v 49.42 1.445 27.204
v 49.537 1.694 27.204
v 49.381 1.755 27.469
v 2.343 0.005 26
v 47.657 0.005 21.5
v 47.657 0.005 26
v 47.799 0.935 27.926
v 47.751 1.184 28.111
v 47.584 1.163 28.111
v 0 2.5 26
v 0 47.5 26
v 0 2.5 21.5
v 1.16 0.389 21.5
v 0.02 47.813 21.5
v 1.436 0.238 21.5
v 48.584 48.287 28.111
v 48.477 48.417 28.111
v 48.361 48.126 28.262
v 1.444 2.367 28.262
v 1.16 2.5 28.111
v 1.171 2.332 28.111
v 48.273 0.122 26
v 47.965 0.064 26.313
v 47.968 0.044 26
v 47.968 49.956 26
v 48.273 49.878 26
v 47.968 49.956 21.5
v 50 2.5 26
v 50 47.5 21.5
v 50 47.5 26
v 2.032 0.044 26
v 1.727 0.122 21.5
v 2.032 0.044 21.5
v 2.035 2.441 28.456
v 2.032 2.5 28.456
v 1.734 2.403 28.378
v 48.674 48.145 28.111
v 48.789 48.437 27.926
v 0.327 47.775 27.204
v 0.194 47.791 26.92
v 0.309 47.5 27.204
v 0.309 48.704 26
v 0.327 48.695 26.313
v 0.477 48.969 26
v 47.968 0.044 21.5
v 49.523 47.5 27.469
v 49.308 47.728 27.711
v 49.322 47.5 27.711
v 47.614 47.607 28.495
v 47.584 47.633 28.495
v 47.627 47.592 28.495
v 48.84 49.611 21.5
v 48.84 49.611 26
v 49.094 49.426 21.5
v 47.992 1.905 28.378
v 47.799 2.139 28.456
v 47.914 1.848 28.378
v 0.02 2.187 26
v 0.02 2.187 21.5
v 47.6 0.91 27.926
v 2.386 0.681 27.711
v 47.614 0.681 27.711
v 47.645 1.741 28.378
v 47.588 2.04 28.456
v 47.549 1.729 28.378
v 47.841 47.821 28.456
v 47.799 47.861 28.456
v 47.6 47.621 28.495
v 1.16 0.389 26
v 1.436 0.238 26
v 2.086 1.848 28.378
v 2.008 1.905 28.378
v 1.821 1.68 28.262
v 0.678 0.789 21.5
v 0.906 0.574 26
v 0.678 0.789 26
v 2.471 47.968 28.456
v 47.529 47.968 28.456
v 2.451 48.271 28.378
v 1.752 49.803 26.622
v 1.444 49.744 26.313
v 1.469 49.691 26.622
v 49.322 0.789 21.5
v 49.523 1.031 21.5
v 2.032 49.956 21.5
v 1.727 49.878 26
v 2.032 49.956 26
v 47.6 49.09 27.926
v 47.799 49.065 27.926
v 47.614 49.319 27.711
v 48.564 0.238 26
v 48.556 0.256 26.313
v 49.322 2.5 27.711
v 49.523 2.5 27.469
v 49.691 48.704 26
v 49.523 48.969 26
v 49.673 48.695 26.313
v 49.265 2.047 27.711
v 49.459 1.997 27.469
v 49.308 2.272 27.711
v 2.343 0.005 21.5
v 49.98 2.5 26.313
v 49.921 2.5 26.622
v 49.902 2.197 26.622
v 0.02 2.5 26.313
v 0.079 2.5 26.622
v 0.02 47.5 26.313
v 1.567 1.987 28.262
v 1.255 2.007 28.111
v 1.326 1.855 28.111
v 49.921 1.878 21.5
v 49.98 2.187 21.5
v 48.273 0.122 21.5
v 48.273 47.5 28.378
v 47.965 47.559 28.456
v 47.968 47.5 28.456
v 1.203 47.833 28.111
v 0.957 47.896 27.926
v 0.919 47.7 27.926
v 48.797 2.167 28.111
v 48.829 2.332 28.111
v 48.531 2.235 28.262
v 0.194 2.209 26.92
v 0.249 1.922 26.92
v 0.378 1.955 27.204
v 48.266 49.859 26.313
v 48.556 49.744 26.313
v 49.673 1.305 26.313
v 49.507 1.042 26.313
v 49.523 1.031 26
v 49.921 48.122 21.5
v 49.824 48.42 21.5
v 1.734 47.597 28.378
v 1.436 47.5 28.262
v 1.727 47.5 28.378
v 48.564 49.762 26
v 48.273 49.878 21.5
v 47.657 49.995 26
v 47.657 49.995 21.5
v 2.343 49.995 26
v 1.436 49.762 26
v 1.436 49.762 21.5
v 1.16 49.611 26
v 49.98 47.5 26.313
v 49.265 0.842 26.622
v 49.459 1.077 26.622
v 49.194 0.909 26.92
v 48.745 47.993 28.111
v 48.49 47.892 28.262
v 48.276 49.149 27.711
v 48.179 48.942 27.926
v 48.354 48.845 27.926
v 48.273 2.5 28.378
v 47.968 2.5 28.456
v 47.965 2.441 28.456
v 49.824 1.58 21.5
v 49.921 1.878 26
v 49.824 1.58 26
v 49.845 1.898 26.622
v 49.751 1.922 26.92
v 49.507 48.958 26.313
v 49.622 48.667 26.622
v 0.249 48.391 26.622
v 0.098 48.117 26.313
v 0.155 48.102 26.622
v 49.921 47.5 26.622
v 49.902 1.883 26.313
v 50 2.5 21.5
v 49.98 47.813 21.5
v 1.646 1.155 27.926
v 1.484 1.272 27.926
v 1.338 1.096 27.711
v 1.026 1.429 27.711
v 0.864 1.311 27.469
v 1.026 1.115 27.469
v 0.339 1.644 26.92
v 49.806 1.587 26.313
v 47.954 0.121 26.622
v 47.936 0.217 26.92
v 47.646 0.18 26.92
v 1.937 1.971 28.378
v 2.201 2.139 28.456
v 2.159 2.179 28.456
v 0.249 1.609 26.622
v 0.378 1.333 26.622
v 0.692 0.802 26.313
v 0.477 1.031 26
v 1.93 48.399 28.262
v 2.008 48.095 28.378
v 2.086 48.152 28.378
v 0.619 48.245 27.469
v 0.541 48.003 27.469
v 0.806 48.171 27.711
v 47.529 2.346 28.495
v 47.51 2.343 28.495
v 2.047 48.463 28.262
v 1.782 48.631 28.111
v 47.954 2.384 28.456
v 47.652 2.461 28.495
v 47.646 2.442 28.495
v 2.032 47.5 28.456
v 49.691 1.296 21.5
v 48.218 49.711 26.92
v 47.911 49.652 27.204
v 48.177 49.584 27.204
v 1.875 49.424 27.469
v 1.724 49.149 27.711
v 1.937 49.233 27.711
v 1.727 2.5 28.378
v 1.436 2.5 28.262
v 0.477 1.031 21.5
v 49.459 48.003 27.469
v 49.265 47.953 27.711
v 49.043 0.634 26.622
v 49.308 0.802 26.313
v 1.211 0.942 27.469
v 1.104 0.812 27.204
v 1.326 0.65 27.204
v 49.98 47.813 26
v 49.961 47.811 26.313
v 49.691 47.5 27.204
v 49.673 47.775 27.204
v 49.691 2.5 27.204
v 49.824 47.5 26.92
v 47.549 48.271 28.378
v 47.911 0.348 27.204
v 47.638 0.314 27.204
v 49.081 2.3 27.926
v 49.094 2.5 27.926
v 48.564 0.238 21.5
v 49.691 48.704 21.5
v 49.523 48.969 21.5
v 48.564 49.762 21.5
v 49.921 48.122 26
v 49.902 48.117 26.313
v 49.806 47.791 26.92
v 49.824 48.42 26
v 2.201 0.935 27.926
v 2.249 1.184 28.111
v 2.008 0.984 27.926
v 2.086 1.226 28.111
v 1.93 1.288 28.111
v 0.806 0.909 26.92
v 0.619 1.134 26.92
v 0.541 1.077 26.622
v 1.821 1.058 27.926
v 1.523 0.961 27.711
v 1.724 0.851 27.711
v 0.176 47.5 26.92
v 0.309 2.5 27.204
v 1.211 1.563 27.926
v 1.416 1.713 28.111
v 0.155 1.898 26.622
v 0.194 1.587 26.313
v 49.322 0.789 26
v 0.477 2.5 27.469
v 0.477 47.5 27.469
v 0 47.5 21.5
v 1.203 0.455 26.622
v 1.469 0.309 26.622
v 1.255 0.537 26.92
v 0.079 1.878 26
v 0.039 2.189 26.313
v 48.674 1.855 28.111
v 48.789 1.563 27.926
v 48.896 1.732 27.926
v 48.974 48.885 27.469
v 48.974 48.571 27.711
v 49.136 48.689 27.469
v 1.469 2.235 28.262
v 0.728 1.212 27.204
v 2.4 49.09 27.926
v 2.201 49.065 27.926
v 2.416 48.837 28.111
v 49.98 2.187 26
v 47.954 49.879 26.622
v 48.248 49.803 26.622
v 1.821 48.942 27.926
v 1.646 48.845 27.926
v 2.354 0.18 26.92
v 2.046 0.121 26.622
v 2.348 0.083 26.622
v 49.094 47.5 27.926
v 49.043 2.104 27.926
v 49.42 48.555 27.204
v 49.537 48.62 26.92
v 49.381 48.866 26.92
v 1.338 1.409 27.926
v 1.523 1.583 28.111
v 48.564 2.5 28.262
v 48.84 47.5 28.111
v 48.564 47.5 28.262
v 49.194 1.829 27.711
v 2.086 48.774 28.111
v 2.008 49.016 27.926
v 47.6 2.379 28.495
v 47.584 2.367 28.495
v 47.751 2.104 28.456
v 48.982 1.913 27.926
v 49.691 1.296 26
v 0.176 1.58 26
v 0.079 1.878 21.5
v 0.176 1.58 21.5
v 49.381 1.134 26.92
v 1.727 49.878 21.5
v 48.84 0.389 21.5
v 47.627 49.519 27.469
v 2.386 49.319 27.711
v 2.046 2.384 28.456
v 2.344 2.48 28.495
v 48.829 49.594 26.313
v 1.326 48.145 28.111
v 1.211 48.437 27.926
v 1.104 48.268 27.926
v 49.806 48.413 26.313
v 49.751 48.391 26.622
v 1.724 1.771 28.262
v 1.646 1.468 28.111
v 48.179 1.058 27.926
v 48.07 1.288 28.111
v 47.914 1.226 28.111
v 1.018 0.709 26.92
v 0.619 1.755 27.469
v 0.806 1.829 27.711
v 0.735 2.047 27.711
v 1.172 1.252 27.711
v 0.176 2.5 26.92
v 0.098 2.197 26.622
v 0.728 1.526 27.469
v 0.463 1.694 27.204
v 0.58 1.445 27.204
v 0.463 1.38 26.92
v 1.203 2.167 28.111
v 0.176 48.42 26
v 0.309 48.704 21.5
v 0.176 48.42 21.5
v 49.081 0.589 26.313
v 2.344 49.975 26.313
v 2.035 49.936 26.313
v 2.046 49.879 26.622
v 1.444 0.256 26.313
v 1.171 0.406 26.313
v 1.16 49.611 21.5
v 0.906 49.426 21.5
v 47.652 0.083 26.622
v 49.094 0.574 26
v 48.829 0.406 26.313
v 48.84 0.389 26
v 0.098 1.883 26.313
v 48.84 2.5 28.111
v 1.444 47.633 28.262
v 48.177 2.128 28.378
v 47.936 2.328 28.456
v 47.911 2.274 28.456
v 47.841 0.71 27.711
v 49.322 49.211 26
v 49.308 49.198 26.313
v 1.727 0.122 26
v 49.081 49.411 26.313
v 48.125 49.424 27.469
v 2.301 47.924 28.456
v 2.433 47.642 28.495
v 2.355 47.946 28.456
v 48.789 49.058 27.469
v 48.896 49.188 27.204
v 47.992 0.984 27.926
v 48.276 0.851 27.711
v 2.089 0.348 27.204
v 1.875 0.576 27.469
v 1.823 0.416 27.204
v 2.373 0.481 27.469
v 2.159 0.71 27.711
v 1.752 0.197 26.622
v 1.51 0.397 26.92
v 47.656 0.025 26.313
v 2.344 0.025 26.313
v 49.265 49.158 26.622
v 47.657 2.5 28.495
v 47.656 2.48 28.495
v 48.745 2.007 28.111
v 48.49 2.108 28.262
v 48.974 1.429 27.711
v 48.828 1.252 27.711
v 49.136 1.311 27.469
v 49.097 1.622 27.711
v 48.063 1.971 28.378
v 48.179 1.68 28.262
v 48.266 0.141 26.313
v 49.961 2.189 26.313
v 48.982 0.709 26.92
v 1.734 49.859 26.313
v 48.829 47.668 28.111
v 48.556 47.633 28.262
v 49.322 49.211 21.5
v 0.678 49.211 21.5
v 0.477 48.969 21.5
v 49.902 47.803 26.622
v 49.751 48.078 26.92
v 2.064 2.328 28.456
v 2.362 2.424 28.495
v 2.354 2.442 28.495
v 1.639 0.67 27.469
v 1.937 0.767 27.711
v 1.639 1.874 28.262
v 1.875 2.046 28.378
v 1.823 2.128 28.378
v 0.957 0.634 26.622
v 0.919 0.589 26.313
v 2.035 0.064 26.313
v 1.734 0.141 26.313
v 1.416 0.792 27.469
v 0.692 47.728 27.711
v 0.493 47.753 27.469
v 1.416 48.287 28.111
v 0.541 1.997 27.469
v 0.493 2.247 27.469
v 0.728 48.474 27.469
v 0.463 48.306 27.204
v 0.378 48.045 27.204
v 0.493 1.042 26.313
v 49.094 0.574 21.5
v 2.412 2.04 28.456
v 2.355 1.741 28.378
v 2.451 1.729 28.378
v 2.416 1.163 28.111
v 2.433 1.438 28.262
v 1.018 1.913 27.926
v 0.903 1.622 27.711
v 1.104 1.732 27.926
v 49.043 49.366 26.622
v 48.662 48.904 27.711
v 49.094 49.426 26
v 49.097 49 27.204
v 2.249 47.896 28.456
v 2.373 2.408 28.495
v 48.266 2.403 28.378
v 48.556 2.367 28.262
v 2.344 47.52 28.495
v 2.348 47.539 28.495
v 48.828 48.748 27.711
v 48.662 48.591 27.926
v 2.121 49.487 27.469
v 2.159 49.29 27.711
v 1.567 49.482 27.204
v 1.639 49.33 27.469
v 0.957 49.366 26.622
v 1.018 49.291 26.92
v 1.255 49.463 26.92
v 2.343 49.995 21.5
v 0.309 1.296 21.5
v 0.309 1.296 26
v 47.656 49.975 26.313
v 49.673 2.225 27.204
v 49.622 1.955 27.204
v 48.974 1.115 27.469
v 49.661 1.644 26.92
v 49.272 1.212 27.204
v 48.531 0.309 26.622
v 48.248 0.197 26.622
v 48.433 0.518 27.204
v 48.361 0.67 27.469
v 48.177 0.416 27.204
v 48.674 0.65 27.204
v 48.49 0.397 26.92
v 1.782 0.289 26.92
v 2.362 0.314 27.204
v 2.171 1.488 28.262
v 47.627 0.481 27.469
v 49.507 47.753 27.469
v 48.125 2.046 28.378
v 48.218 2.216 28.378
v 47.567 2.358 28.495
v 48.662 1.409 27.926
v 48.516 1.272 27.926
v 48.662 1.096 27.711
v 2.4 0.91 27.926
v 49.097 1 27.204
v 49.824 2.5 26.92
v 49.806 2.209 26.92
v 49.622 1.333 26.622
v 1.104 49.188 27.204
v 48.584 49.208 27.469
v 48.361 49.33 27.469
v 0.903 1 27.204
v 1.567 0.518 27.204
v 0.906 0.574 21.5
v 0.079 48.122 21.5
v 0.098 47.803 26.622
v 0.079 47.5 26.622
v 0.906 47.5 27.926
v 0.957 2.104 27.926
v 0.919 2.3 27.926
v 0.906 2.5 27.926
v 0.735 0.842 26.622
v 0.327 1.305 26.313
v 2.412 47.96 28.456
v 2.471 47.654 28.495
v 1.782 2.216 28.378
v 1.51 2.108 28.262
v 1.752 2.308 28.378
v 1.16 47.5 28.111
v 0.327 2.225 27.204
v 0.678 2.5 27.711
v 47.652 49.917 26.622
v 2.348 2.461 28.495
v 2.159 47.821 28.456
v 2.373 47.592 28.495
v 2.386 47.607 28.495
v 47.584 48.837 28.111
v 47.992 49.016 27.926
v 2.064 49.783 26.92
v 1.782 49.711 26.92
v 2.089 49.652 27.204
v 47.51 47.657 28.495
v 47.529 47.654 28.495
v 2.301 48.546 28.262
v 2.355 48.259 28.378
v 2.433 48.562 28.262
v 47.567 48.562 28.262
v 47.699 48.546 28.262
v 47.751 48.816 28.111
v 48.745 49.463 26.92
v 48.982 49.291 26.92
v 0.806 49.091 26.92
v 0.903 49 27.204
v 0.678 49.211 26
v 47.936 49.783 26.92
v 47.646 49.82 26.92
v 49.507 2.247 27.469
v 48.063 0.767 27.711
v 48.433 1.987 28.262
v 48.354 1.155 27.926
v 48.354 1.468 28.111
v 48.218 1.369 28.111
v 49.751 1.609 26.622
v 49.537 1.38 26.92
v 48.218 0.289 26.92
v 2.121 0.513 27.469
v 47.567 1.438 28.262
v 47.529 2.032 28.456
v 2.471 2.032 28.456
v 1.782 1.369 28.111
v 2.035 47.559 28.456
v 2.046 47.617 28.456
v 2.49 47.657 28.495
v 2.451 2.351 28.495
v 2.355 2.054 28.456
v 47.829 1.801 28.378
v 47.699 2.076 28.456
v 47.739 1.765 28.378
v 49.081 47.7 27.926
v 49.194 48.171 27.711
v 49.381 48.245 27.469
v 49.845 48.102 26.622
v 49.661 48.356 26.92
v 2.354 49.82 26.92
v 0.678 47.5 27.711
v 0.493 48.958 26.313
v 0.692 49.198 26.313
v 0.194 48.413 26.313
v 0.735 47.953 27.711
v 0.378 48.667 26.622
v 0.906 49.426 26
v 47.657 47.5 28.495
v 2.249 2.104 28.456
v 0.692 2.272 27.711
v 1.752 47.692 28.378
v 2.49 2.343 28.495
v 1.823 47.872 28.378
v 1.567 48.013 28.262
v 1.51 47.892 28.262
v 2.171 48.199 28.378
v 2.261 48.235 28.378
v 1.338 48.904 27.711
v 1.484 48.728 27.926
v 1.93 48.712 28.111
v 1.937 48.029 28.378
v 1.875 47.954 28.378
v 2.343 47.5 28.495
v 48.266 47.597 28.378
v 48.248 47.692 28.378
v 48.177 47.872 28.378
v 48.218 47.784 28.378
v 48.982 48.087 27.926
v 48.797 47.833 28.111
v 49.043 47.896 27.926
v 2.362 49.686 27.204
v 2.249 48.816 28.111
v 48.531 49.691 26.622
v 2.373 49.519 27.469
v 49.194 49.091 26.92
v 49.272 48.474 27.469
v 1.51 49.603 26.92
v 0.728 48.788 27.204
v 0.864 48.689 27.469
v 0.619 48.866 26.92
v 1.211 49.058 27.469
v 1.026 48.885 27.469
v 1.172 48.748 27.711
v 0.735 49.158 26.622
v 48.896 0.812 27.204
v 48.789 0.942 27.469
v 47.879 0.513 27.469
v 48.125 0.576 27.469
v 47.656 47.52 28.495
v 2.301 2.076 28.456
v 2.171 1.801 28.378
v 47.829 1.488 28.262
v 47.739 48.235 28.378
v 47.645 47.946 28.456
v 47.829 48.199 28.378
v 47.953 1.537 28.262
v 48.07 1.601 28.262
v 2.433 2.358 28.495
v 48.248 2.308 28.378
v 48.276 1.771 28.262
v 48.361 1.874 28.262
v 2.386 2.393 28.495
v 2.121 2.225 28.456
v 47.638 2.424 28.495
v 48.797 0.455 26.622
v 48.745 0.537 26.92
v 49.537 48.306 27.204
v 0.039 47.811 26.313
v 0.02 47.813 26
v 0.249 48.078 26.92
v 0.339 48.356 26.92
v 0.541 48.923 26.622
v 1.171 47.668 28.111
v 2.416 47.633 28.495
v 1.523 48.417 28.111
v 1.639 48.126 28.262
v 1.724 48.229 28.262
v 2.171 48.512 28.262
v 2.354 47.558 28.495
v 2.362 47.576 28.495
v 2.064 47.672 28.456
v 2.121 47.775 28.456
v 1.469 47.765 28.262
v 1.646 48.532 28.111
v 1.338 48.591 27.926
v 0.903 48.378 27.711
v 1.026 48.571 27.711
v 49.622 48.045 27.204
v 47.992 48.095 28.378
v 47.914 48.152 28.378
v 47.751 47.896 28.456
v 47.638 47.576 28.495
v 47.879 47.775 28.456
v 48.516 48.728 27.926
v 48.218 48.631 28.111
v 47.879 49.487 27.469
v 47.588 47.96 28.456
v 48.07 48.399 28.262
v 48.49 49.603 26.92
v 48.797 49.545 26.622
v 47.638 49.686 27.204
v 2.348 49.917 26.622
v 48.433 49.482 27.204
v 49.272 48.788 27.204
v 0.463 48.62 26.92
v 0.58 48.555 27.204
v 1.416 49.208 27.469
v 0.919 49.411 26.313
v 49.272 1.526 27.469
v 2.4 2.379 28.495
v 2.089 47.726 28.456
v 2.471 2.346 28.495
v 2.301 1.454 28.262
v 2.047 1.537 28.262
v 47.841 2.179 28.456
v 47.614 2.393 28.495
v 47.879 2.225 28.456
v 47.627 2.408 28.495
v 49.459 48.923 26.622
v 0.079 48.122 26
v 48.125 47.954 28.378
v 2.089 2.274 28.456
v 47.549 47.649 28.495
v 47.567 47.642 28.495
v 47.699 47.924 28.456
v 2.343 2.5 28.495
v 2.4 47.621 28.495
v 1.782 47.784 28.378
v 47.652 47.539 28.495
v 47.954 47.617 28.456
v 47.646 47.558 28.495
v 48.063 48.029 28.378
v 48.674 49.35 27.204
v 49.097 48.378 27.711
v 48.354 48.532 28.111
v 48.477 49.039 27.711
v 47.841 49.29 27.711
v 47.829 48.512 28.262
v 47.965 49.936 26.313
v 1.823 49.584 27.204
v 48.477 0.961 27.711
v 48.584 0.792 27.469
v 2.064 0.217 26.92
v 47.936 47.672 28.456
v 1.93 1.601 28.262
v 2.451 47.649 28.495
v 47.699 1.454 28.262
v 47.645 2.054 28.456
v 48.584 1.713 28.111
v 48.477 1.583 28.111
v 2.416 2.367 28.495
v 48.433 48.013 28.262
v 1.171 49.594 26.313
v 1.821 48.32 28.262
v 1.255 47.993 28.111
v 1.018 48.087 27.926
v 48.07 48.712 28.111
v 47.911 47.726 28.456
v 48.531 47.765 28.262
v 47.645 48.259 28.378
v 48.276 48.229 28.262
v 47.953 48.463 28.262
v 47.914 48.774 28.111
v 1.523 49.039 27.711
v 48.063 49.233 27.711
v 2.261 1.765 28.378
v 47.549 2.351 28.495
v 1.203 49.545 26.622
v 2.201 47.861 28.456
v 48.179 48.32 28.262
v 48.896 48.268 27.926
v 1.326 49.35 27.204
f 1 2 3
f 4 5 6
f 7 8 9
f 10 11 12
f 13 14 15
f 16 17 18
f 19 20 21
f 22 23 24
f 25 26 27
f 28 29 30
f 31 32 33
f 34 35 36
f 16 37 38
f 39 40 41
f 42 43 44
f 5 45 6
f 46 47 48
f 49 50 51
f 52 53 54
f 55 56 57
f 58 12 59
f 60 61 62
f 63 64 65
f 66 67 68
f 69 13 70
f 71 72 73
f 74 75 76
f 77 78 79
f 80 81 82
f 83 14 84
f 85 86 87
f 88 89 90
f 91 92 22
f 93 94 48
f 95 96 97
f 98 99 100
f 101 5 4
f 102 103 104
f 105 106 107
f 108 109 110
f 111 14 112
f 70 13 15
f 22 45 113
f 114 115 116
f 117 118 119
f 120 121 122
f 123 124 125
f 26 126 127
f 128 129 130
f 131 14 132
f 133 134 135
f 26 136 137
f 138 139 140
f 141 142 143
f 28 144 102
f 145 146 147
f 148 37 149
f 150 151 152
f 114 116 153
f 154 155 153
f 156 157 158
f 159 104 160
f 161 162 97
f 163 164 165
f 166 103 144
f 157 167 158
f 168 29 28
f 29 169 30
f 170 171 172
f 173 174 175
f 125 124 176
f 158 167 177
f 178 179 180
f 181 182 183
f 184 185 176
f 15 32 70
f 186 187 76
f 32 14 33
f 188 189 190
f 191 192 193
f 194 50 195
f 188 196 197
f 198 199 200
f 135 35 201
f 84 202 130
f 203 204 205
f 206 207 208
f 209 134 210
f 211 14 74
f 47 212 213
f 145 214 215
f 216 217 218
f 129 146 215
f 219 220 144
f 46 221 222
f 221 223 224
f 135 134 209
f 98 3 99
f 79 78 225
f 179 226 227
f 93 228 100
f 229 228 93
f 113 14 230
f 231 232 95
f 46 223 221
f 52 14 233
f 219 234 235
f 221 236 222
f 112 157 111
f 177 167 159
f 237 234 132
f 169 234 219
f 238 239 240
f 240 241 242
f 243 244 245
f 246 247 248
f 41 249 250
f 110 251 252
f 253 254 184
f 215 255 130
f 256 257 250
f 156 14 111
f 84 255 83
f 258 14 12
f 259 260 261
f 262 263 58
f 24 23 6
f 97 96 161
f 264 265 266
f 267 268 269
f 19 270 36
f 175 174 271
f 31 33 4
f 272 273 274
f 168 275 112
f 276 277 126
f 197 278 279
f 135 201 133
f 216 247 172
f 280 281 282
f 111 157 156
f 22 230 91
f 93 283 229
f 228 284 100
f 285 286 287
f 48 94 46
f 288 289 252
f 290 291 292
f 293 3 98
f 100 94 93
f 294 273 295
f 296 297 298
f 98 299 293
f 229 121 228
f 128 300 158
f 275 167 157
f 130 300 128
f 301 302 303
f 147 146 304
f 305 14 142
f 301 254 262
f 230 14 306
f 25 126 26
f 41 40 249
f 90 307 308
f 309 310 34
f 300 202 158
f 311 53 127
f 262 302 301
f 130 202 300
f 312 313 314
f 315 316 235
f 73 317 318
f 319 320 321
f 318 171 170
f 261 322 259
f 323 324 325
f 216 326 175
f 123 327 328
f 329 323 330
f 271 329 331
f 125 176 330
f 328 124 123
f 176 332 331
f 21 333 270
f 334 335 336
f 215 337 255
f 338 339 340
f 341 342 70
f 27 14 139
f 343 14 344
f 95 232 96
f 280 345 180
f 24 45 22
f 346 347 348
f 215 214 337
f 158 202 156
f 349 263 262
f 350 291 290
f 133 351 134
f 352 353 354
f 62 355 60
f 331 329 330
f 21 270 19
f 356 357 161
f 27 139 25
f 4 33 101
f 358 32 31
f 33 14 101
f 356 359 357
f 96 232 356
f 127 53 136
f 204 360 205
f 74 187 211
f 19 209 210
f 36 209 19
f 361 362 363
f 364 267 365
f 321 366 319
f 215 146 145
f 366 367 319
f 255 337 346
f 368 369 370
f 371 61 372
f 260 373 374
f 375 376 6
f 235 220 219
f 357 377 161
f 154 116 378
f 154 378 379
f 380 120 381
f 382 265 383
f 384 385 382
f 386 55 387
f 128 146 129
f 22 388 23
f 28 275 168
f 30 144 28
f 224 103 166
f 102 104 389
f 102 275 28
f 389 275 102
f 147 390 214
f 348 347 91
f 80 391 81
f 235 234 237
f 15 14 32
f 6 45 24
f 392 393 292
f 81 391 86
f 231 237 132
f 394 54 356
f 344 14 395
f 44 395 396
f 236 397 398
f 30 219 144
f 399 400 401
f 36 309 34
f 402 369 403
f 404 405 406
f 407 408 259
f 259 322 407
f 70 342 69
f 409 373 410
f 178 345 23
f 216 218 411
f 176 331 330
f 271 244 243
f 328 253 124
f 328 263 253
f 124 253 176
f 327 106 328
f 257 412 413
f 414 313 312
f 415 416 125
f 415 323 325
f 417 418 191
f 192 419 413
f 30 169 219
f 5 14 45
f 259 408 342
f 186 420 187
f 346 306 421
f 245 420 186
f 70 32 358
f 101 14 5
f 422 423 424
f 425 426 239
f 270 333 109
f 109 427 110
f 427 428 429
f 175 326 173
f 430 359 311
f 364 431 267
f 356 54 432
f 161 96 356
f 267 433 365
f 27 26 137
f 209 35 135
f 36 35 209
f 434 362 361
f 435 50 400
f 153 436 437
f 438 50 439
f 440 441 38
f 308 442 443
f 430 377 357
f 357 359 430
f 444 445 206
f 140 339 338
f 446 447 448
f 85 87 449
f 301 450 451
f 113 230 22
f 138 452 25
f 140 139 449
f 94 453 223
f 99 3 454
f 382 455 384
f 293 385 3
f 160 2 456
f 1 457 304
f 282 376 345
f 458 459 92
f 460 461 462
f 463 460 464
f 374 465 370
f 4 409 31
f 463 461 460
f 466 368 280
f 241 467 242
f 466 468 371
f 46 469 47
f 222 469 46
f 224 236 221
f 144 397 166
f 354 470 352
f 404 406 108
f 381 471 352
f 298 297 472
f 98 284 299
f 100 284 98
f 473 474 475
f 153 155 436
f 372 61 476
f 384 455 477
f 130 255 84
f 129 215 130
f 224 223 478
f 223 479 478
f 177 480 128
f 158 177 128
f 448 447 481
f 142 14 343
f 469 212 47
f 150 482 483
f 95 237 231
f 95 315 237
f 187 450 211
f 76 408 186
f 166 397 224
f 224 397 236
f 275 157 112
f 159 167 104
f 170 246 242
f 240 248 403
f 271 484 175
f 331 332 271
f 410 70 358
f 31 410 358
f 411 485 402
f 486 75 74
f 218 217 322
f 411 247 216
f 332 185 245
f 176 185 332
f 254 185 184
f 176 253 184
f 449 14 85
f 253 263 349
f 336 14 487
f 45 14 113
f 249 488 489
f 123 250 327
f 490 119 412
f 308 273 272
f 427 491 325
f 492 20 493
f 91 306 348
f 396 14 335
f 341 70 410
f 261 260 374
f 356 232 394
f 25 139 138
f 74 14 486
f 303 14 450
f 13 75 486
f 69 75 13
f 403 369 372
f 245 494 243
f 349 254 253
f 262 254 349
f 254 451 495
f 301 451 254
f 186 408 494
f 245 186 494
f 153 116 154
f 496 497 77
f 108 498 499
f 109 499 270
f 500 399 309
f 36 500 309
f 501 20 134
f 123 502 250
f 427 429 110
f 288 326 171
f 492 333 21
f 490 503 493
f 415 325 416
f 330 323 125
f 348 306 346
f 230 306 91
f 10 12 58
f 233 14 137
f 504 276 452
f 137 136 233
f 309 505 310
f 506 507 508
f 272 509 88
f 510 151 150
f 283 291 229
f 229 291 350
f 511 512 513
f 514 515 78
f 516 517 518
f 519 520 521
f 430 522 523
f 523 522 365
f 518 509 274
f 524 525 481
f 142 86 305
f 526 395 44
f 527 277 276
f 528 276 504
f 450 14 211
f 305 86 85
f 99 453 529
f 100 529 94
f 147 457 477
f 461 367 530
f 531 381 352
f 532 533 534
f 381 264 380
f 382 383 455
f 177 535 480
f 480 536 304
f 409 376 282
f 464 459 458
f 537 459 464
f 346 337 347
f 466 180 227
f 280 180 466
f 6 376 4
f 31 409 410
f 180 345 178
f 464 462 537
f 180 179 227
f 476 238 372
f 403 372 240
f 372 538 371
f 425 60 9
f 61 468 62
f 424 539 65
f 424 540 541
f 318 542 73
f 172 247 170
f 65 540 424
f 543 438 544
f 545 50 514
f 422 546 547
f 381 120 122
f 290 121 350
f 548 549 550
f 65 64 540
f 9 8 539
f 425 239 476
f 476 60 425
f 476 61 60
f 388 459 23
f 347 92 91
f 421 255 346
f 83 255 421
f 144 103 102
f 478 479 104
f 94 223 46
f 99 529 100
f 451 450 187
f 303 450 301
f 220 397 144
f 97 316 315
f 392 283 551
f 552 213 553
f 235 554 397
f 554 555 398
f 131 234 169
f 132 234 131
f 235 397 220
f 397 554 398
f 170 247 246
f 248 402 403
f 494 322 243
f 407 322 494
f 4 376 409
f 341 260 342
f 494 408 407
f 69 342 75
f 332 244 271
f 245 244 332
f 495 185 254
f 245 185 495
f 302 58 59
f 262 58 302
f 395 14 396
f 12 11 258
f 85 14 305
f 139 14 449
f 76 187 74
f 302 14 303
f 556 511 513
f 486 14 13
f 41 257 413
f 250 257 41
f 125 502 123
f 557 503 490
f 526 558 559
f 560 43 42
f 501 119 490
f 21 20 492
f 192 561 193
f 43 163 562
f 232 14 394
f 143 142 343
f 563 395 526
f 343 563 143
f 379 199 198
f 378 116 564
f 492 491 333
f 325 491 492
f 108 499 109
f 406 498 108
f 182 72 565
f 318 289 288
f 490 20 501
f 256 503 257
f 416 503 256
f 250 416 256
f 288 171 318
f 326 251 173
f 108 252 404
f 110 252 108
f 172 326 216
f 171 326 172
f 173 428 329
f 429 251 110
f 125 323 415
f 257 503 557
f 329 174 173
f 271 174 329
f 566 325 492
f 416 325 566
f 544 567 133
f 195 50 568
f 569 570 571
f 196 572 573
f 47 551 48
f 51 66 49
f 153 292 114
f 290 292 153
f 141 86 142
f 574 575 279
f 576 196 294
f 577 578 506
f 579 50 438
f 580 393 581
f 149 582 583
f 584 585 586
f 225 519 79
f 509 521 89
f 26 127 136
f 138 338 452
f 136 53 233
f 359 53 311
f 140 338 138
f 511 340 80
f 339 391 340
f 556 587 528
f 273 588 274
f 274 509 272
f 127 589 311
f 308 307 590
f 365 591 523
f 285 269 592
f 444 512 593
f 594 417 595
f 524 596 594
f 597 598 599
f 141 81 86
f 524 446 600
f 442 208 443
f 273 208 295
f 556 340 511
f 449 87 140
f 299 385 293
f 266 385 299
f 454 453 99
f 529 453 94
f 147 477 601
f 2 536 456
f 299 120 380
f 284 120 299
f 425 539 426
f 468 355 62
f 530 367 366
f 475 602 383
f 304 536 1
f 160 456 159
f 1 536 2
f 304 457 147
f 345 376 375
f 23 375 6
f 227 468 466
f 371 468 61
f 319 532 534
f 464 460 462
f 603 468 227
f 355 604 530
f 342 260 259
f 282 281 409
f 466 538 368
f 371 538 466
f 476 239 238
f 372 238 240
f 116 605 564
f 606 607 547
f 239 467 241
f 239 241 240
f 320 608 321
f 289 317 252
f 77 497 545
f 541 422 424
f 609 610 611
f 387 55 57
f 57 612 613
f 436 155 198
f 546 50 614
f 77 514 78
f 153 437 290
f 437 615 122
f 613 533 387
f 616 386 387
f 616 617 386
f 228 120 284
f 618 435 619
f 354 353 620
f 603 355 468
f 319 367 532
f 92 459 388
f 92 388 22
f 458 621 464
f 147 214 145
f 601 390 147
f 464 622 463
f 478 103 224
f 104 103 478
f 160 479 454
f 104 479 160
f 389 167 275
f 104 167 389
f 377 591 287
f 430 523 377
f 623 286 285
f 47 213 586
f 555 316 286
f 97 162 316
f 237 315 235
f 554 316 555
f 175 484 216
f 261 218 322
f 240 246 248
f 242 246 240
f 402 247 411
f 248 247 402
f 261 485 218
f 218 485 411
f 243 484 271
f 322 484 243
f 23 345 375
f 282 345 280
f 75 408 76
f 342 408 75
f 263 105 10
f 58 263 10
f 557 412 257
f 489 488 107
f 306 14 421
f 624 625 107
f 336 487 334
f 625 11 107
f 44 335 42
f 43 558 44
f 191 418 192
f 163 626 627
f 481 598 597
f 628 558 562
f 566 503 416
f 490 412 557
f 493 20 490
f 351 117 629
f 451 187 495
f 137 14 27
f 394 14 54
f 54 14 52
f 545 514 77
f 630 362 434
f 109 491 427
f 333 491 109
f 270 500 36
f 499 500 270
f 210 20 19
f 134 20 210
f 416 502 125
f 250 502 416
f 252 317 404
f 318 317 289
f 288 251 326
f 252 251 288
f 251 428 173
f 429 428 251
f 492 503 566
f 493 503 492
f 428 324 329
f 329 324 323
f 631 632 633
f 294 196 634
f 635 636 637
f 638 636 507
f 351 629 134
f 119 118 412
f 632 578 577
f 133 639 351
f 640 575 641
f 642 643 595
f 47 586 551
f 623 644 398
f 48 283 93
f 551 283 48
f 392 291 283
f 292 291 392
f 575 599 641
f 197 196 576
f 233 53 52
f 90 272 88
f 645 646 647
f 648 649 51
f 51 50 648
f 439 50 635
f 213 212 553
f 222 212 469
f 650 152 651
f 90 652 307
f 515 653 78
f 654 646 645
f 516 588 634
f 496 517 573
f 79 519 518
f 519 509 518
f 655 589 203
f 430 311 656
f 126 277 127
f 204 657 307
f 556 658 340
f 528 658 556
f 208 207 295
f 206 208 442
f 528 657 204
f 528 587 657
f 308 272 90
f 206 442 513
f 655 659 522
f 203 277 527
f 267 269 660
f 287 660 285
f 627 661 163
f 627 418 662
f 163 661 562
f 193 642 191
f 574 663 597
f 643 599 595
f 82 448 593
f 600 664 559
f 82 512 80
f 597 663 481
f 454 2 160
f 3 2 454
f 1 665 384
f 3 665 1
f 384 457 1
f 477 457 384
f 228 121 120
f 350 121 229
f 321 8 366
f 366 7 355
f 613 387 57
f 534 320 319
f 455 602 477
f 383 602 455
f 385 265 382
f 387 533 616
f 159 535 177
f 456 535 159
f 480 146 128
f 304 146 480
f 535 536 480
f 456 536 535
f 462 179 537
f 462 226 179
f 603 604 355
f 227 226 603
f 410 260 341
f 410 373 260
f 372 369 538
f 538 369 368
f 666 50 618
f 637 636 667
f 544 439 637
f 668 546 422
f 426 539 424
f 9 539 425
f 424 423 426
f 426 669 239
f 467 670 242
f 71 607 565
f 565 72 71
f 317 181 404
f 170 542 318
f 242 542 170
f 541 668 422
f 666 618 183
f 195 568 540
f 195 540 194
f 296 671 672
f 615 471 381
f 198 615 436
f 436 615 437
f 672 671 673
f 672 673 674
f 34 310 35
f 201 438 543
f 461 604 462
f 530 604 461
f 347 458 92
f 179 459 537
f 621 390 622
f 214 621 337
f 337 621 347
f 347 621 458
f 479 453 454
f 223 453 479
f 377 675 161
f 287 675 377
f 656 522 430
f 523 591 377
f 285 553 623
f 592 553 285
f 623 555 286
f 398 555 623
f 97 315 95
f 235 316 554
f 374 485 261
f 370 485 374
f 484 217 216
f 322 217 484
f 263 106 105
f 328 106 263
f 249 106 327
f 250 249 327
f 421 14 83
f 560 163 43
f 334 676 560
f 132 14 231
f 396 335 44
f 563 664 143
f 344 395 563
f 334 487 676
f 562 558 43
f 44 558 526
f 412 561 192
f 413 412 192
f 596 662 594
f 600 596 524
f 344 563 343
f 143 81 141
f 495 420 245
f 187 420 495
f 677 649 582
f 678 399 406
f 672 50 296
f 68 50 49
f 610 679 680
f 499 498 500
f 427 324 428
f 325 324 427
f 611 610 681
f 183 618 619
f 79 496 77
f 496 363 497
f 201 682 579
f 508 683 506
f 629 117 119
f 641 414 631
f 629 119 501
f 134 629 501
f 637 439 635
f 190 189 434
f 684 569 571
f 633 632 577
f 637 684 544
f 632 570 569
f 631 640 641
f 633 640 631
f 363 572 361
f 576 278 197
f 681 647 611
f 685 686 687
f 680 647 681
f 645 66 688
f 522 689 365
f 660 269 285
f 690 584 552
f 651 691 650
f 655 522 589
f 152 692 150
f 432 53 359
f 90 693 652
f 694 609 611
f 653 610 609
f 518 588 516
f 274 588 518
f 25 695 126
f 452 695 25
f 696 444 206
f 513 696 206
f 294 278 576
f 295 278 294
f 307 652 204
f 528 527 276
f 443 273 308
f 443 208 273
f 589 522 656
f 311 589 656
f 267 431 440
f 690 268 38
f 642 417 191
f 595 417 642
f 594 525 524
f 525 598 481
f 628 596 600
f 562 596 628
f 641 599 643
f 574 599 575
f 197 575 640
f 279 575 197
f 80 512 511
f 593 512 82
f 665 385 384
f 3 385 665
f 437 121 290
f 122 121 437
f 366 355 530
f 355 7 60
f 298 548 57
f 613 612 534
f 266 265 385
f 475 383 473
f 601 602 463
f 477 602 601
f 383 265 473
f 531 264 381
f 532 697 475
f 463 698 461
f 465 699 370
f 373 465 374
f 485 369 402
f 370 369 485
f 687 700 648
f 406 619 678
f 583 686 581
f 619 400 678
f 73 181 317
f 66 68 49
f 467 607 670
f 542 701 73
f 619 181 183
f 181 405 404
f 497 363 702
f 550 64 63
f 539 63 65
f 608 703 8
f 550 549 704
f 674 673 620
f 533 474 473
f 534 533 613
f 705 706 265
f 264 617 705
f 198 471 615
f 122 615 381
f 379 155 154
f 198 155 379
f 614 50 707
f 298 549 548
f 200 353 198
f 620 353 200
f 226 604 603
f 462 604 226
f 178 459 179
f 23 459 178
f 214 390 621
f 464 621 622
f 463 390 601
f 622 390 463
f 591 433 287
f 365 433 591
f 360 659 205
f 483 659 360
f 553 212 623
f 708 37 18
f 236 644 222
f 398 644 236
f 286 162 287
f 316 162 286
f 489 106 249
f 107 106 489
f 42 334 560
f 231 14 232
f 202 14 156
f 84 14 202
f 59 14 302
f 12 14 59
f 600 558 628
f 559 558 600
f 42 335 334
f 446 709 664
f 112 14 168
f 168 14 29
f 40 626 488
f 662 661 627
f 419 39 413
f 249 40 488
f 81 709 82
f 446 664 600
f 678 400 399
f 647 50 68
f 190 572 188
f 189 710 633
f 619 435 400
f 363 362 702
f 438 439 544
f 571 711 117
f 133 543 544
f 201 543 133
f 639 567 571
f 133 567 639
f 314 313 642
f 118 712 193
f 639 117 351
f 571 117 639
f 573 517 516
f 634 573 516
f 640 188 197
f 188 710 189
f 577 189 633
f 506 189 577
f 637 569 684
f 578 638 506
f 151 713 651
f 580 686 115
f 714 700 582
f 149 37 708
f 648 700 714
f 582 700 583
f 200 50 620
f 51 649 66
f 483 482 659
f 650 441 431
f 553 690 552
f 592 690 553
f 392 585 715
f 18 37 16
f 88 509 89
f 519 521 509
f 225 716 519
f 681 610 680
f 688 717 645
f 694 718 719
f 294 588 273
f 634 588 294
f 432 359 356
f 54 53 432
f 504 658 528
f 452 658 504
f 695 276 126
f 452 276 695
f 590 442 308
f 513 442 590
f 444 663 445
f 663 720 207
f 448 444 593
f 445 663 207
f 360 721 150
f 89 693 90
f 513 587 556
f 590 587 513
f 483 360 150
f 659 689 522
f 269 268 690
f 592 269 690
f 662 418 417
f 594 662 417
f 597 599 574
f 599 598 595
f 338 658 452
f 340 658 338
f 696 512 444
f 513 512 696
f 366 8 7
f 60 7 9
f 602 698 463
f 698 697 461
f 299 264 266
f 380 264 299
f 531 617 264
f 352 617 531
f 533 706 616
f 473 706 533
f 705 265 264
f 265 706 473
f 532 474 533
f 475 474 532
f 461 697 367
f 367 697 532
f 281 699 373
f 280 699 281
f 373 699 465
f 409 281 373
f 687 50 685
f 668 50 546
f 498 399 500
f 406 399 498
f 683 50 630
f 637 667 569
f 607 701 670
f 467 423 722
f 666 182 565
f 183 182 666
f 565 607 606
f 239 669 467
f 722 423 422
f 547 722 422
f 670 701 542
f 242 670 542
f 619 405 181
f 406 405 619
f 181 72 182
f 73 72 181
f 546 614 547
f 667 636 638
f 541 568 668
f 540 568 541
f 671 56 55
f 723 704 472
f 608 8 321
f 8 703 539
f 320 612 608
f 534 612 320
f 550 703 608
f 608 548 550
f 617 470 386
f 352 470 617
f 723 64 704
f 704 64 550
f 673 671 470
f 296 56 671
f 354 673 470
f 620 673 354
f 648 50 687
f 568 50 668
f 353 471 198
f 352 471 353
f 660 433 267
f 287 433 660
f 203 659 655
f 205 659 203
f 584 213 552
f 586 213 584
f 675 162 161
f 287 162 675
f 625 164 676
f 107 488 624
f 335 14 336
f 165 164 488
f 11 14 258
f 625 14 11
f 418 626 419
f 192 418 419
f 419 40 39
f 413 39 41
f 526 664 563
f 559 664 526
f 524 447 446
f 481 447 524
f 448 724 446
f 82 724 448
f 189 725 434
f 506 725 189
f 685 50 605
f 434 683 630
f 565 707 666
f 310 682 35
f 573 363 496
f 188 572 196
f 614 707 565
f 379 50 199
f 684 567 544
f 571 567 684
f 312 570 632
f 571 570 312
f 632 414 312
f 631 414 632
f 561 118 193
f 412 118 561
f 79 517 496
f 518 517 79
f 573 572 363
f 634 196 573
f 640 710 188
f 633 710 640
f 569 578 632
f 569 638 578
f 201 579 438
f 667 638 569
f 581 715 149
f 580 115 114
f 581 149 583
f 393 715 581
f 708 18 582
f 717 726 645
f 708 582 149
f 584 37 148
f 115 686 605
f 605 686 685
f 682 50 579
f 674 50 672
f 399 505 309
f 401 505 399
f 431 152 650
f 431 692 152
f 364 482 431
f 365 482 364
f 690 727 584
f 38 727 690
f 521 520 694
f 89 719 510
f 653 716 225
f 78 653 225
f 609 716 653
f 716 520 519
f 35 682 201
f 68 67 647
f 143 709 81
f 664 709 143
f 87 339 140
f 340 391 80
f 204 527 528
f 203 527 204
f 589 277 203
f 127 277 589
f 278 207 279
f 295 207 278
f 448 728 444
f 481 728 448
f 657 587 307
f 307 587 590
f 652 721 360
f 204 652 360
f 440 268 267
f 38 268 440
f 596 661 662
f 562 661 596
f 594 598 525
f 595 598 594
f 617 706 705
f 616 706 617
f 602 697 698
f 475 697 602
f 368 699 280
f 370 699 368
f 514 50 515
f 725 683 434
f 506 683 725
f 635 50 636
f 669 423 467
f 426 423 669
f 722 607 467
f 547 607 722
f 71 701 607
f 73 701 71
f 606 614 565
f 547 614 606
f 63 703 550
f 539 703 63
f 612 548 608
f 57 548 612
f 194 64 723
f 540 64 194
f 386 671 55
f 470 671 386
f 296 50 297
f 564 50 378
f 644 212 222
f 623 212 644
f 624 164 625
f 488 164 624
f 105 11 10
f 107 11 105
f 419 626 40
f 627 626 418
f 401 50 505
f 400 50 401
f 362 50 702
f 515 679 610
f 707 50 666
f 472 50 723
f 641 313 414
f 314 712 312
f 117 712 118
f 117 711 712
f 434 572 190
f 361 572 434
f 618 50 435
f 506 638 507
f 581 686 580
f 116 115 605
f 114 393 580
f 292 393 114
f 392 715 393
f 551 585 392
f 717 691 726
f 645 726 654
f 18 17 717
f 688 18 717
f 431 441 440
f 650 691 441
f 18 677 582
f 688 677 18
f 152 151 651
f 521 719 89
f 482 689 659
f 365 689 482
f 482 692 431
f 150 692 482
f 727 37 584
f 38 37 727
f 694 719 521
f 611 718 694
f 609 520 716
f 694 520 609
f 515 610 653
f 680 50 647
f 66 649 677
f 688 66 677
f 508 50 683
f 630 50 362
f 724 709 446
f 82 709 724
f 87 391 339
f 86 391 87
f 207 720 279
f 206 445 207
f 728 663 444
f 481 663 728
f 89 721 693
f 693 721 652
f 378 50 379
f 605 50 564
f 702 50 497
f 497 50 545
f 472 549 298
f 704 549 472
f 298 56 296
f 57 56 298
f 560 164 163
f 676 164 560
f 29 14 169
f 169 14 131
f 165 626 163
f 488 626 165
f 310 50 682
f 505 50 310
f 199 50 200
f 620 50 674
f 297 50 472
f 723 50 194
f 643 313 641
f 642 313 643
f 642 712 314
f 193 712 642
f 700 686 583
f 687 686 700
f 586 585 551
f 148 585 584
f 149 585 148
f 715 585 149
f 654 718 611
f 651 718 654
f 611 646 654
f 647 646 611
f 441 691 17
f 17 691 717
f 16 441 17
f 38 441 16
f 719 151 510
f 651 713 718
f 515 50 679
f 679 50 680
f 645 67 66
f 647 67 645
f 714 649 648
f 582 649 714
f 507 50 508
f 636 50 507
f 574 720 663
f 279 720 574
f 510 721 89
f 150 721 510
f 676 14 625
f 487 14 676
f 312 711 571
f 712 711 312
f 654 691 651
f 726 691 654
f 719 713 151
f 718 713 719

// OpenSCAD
//libraries used to create seats 



center1 = [25, 25, 25];

//simple seat

//dimensions = [length(x), width(y), depth(z)]
seat1_dimensions = [50, 50, 10];

//seat1(center1, seat1_dimensions);

module seat1(center, seat_dimensions) {
    //seat dimensions
    seatLength = seat_dimensions[0];
    seatWidth = seat_dimensions[1];
    seatDepth = seat_dimensions[2];
    
    translate ([center[0], center[1], center[2]]) {
        //center
        translate ([-5/2, -5/2, -5/2])
            %cube([5, 5, 5]);
        
        //seat
        translate ([-seatLength/2, -seatWidth/2, -seatDepth/2])
            cube([seatLength, seatWidth, seatDepth]);
    }
}





//champhered seat

//top and middle sections of the seat
top2_Dimensions = [50, 50]; //[length(x), width(y)]

//[length(x), width(y), depth(z)]
mid2_Dimensions = [55, 55, 5];      //depth is its position above the base of the seat

//bottom section of seat, acts as main dimension when other section dimension arent given
//[length(x), width(y), full depth(z)]
seat2_Dimensions = [50, 50, 10]; 

//defined 
//seat2(center1, seat2_Dimensions, mid2_Dimensions, top2_Dimensions);

//undefined 
//seat2(center1, seat2_Dimensions);

module seat2(center, seat_dimensions, mid_Dimensions = "undefined", top_Dimensions = "undefined") {
    //seat dimensions
    bottomSeatLength = seat_dimensions[0];
    bottomSeatWidth = seat_dimensions[1];
    
    seatDepth = seat_dimensions[2];
    
    if ((mid_Dimensions == "undefined") || (top_Dimensions == "undefined")) {
        echo("undefined");
        
        topSeatLength = bottomSeatLength;
        topSeatWidth = bottomSeatWidth;
    
        midSeatLength = bottomSeatLength*1.10;
        midSeatWidth = bottomSeatWidth*1.10;
        midSeatDepth = seatDepth/2;
        
        //seat
        translate ([center[0], center[1], center[2]]) {
            //center
            translate ([-5/2, -5/2, -5/2])
                %cube([5, 5, 5]);
        
            //seat
            translate ([0, 0, -seatDepth/2]) {
                hull() {
                    //top
                    translate ([-topSeatLength/2, -topSeatWidth/2, seatDepth])
                        cube([topSeatLength, topSeatWidth, seatDepth*0.0001]);
            
                    //middle
                    translate ([-midSeatLength/2, -midSeatWidth/2, midSeatDepth])
                        cube([midSeatLength, midSeatWidth, seatDepth*0.0001]);
        
                    //bottom    
                    translate ([-bottomSeatLength/2, -bottomSeatWidth/2, 0])
                        cube([bottomSeatLength, bottomSeatWidth, seatDepth*0.0001]);
                }
            }
        }
    }
    
    else {
        echo("defined");
        
        topSeatLength = top_Dimensions[0];
        topSeatWidth = top_Dimensions[1];
    
        midSeatLength = mid_Dimensions[0];
        midSeatWidth = mid_Dimensions[1];
        midSeatDepth = mid_Dimensions[2];
    
        //seat
        translate ([center[0], center[1], center[2]]) {
            //center
            translate ([-5/2, -5/2, -5/2])
                %cube([5, 5, 5]);
        
            //seat
            translate ([0, 0, -seatDepth/2]) {
                hull() {
                    //top
                    translate ([-topSeatLength/2, -topSeatWidth/2, seatDepth])
                        cube([topSeatLength, topSeatWidth, seatDepth*0.0001]);
            
                    //middle
                    translate ([-midSeatLength/2, -midSeatWidth/2, midSeatDepth])
                        cube([midSeatLength, midSeatWidth, seatDepth*0.0001]);
        
                    //bottom    
                    translate ([-bottomSeatLength/2, -bottomSeatWidth/2, 0])
                        cube([bottomSeatLength, bottomSeatWidth, seatDepth*0.0001]);
                }
            }
        }
    }
}


/*


//multi width seat

//dimensions = [length(x), frontWidth(y), backWidth(y), depth(z)]
seat3_dimensions = [60, 60, 40, 15];

translate([0, -100, 0])
    seat3(seat3_dimensions);

module seat3(seat3_dimensions) {
    //seat dimensions
    seatLength = seat3_dimensions[0];
    frontSeatWidth = seat3_dimensions[1];
    backSeatWidth = seat3_dimensions[2];
    seatDepth = seat3_dimensions[3];
    
    //seat
    hull() {
        translate ([seatLength/2, -frontSeatWidth/2, 0])
            cube ([seatLength*0.001, frontSeatWidth, seatDepth]); //front 
        translate ([-seatLength/2, -backSeatWidth/2, 0])
            cube ([seatLength*0.001, backSeatWidth, seatDepth]);  //back
    }
}




//fourth seat: combination of seat 2 and 3

//dimensions = [length(x), frontWidth(y), backWidth(y), depth(z)]
topSeat4Dimensions = [40, 40, 40]; //[length(x), frontWidth(y), backWidth(y)]

midSeat4Dimensions = [50, 50, 50, 5]; //[length(x), frontWidth(y), backWidth(y), depth(z)]

bottomSeat4Dimensions = [40, 40, 40]; //[length(x), frontWidth(y), backWidth(y)]

seat4Depth = 10; //full seat depth

seat4_dimensions = [topSeat4Dimensions, midSeat4Dimensions, bottomSeat4Dimensions, seat4Depth];

translate([100, 0, 0])
    seat4(seat4_dimensions);

module seat4(seat4_dimensions) {
    //seat dimensions
    topSeatLength = seat4_dimensions[0][0];
    topSeatFrontWidth = seat4_dimensions[0][1];
    topSeatBackWidth = seat4_dimensions[0][2];
    
    midSeatLength = seat4_dimensions[1][0];
    midSeatFrontWidth = seat4_dimensions[1][1];
    midSeatBackWidth = seat4_dimensions[1][2];
    midSeatDepth = seat4_dimensions[1][3];
    
    bottomSeatLength = seat4_dimensions[2][0];
    bottomSeatFrontWidth = seat4_dimensions[2][1];
    bottomSeatBackWidth = seat4_dimensions[2][2];
    
    seatDepth = seat4_dimensions[3];
    
    //seat
    hull() {
        //top
        hull() {
            translate ([topSeatLength/2, -topSeatFrontWidth/2, seatDepth])
                cube ([topSeatLength*0.001, topSeatFrontWidth, seatDepth*0.001]); //front 
            translate ([-topSeatLength/2, -topSeatBackWidth/2, seatDepth])
                cube ([topSeatLength*0.001, topSeatBackWidth, seatDepth*0.001]);  //back
        }
            
        //middle
        hull() {
            translate ([midSeatLength/2, -midSeatFrontWidth/2, midSeatDepth])
                cube ([midSeatLength*0.001, midSeatFrontWidth, seatDepth*0.001]); //front 
            translate ([-midSeatLength/2, -midSeatBackWidth/2, midSeatDepth])
                cube ([midSeatLength*0.001, midSeatBackWidth, seatDepth*0.001]);  //back
        }
        
        //bottom    
        hull() {
            translate ([bottomSeatLength/2, -bottomSeatFrontWidth/2, 0])
                cube ([bottomSeatLength*0.001, bottomSeatFrontWidth, seatDepth*0.001]); //front 
            translate ([-bottomSeatLength/2, -bottomSeatBackWidth/2, 0])
                cube ([bottomSeatLength*0.001, bottomSeatBackWidth, seatDepth*0.001]);  //back
        }
    }
}





//seat and back connected with a curve 

//dimensions = [length(x), depth(z)]
back6_Dimensions = [5, 50];
seat6_Dimensions = [50, 5];


//radius of seat and back curve 
//affects th curvature of the back
radius6 = 8;        //radius <= backDepth/2 or seatLength/2

combinedWidth = 50;    //width of both the seat and back

translate ([-100, 0, 0]) {
    seat_back(back6_Dimensions, seat6_Dimensions, combinedWidth, radius6);
}

module seat_back(back6_Dimensions, seat6_Dimensions, combinedWidth, radius6) {
    //back dimensions
    backLength = back6_Dimensions[0];
    backDepth = back6_Dimensions[1];
    
    //seat dimensions
    seatLength = seat6_Dimensions[0];
    seatDepth = seat6_Dimensions[1];
    
    difference() {
        //main
        hull() {
            translate ([0, -combinedWidth/2, 0])
                cube ([seatLength/2, combinedWidth, seatDepth]);
                
            translate ([-seatLength/2 + radius6, combinedWidth/2, radius6])
                rotate([90, 0, 0])
                    cylinder (combinedWidth, radius6, radius6, $fn = radius6*10);
                
            translate ([-seatLength/2, -combinedWidth/2, backDepth/2])
                cube ([backLength, combinedWidth, backDepth/2]);
        }
        
        //cutout
        translate([backLength, 0, seatDepth])
            hull() {
                translate ([0, -combinedWidth, 0])
                    cube ([seatLength/2, combinedWidth*2, seatDepth]);
                    
                translate ([-seatLength/2 + radius6, combinedWidth, radius6])
                    rotate([90, 0, 0])
                        cylinder (combinedWidth*2, radius6, radius6, $fn = radius6*10);
                    
                translate ([-seatLength/2, -combinedWidth, backDepth/2])
                    cube ([backLength, combinedWidth*2, backDepth/2]);
            }
    }
}


*/


//rounded edges

//dimensions = [length(x), width(y), depth(z)]
seat7_dimensions = [50, 50, 7];

edge7_radius = 3;

//defined 
//seat7(center1, seat7_dimensions, edge7_radius);

//undefined 
seat7(center1, seat7_dimensions);

module seat7(center, seat_dimensions, edge_radius = "undefined") {
    //seat dimensions
    seatLength = seat_dimensions[0];
    seatWidth = seat_dimensions[1];
    seatDepth = seat_dimensions[2];
    
    //%cube ([seatLength, seatWidth, seatDepth]);
    
    if (edge_radius == "undefined") {
        echo("undefined");
        
        edge_radius = ((seatLength + seatWidth)/2) * 0.05;
        
        translate ([center[0], center[1], center[2]]) {
            //center
            translate ([-5/2, -5/2, -5/2])
                %cube([5, 5, 5]);
        
            //seat
            translate ([-seatLength/2, -seatWidth/2, -seatDepth/2]) {
                hull() {
                    //top
                    translate([edge_radius, edge_radius, seatDepth - edge_radius])
                        sphere (edge_radius, $fn = edge_radius*20);
            
                    translate([edge_radius, seatWidth - edge_radius, seatDepth - edge_radius])
                        sphere (edge_radius, $fn = edge_radius*20);
                
                    translate([seatLength - edge_radius, edge_radius, seatDepth - edge_radius])
                        sphere (edge_radius, $fn = edge_radius*20);
        
                    translate([seatLength - edge_radius, seatWidth - edge_radius, seatDepth - edge_radius])
                        sphere (edge_radius, $fn = edge_radius*20);
       
                    //bottom
                    translate([edge_radius, edge_radius, 0])
                        cylinder (seatDepth*0.0001, edge_radius, edge_radius, $fn = edge_radius*20);
            
                    translate([edge_radius, seatWidth - edge_radius, 0])
                        cylinder (seatDepth*0.0001, edge_radius, edge_radius, $fn = edge_radius*20);
        
                    translate([seatLength - edge_radius, edge_radius, 0])
                        cylinder (seatDepth*0.0001, edge_radius, edge_radius, $fn = edge_radius*20);
        
                    translate([seatLength - edge_radius, seatWidth - edge_radius, 0])
                        cylinder (seatDepth*0.0001, edge_radius, edge_radius, $fn = edge_radius*20);
                }
            }
        }
    }
    
    else {
        echo("defined");
        
        translate ([center[0], center[1], center[2]]) {
            //center
            translate ([-5/2, -5/2, -5/2])
                %cube([5, 5, 5]);
        
            //seat
            translate ([-seatLength/2, -seatWidth/2, -seatDepth/2]) {
                hull() {
                    //top
                    translate([edge_radius, edge_radius, seatDepth - edge_radius])
                        sphere (edge_radius, $fn = edge_radius*20);
            
                    translate([edge_radius, seatWidth - edge_radius, seatDepth - edge_radius])
                        sphere (edge_radius, $fn = edge_radius*20);
                
                    translate([seatLength - edge_radius, edge_radius, seatDepth - edge_radius])
                        sphere (edge_radius, $fn = edge_radius*20);
        
                    translate([seatLength - edge_radius, seatWidth - edge_radius, seatDepth - edge_radius])
                        sphere (edge_radius, $fn = edge_radius*20);
       
                    //bottom
                    translate([edge_radius, edge_radius, 0])
                        cylinder (seatDepth*0.0001, edge_radius, edge_radius, $fn = edge_radius*20);
            
                    translate([edge_radius, seatWidth - edge_radius, 0])
                        cylinder (seatDepth*0.0001, edge_radius, edge_radius, $fn = edge_radius*20);
        
                    translate([seatLength - edge_radius, edge_radius, 0])
                        cylinder (seatDepth*0.0001, edge_radius, edge_radius, $fn = edge_radius*20);
        
                    translate([seatLength - edge_radius, seatWidth - edge_radius, 0])
                        cylinder (seatDepth*0.0001, edge_radius, edge_radius, $fn = edge_radius*20);
                }
            }
        }
    }
}
